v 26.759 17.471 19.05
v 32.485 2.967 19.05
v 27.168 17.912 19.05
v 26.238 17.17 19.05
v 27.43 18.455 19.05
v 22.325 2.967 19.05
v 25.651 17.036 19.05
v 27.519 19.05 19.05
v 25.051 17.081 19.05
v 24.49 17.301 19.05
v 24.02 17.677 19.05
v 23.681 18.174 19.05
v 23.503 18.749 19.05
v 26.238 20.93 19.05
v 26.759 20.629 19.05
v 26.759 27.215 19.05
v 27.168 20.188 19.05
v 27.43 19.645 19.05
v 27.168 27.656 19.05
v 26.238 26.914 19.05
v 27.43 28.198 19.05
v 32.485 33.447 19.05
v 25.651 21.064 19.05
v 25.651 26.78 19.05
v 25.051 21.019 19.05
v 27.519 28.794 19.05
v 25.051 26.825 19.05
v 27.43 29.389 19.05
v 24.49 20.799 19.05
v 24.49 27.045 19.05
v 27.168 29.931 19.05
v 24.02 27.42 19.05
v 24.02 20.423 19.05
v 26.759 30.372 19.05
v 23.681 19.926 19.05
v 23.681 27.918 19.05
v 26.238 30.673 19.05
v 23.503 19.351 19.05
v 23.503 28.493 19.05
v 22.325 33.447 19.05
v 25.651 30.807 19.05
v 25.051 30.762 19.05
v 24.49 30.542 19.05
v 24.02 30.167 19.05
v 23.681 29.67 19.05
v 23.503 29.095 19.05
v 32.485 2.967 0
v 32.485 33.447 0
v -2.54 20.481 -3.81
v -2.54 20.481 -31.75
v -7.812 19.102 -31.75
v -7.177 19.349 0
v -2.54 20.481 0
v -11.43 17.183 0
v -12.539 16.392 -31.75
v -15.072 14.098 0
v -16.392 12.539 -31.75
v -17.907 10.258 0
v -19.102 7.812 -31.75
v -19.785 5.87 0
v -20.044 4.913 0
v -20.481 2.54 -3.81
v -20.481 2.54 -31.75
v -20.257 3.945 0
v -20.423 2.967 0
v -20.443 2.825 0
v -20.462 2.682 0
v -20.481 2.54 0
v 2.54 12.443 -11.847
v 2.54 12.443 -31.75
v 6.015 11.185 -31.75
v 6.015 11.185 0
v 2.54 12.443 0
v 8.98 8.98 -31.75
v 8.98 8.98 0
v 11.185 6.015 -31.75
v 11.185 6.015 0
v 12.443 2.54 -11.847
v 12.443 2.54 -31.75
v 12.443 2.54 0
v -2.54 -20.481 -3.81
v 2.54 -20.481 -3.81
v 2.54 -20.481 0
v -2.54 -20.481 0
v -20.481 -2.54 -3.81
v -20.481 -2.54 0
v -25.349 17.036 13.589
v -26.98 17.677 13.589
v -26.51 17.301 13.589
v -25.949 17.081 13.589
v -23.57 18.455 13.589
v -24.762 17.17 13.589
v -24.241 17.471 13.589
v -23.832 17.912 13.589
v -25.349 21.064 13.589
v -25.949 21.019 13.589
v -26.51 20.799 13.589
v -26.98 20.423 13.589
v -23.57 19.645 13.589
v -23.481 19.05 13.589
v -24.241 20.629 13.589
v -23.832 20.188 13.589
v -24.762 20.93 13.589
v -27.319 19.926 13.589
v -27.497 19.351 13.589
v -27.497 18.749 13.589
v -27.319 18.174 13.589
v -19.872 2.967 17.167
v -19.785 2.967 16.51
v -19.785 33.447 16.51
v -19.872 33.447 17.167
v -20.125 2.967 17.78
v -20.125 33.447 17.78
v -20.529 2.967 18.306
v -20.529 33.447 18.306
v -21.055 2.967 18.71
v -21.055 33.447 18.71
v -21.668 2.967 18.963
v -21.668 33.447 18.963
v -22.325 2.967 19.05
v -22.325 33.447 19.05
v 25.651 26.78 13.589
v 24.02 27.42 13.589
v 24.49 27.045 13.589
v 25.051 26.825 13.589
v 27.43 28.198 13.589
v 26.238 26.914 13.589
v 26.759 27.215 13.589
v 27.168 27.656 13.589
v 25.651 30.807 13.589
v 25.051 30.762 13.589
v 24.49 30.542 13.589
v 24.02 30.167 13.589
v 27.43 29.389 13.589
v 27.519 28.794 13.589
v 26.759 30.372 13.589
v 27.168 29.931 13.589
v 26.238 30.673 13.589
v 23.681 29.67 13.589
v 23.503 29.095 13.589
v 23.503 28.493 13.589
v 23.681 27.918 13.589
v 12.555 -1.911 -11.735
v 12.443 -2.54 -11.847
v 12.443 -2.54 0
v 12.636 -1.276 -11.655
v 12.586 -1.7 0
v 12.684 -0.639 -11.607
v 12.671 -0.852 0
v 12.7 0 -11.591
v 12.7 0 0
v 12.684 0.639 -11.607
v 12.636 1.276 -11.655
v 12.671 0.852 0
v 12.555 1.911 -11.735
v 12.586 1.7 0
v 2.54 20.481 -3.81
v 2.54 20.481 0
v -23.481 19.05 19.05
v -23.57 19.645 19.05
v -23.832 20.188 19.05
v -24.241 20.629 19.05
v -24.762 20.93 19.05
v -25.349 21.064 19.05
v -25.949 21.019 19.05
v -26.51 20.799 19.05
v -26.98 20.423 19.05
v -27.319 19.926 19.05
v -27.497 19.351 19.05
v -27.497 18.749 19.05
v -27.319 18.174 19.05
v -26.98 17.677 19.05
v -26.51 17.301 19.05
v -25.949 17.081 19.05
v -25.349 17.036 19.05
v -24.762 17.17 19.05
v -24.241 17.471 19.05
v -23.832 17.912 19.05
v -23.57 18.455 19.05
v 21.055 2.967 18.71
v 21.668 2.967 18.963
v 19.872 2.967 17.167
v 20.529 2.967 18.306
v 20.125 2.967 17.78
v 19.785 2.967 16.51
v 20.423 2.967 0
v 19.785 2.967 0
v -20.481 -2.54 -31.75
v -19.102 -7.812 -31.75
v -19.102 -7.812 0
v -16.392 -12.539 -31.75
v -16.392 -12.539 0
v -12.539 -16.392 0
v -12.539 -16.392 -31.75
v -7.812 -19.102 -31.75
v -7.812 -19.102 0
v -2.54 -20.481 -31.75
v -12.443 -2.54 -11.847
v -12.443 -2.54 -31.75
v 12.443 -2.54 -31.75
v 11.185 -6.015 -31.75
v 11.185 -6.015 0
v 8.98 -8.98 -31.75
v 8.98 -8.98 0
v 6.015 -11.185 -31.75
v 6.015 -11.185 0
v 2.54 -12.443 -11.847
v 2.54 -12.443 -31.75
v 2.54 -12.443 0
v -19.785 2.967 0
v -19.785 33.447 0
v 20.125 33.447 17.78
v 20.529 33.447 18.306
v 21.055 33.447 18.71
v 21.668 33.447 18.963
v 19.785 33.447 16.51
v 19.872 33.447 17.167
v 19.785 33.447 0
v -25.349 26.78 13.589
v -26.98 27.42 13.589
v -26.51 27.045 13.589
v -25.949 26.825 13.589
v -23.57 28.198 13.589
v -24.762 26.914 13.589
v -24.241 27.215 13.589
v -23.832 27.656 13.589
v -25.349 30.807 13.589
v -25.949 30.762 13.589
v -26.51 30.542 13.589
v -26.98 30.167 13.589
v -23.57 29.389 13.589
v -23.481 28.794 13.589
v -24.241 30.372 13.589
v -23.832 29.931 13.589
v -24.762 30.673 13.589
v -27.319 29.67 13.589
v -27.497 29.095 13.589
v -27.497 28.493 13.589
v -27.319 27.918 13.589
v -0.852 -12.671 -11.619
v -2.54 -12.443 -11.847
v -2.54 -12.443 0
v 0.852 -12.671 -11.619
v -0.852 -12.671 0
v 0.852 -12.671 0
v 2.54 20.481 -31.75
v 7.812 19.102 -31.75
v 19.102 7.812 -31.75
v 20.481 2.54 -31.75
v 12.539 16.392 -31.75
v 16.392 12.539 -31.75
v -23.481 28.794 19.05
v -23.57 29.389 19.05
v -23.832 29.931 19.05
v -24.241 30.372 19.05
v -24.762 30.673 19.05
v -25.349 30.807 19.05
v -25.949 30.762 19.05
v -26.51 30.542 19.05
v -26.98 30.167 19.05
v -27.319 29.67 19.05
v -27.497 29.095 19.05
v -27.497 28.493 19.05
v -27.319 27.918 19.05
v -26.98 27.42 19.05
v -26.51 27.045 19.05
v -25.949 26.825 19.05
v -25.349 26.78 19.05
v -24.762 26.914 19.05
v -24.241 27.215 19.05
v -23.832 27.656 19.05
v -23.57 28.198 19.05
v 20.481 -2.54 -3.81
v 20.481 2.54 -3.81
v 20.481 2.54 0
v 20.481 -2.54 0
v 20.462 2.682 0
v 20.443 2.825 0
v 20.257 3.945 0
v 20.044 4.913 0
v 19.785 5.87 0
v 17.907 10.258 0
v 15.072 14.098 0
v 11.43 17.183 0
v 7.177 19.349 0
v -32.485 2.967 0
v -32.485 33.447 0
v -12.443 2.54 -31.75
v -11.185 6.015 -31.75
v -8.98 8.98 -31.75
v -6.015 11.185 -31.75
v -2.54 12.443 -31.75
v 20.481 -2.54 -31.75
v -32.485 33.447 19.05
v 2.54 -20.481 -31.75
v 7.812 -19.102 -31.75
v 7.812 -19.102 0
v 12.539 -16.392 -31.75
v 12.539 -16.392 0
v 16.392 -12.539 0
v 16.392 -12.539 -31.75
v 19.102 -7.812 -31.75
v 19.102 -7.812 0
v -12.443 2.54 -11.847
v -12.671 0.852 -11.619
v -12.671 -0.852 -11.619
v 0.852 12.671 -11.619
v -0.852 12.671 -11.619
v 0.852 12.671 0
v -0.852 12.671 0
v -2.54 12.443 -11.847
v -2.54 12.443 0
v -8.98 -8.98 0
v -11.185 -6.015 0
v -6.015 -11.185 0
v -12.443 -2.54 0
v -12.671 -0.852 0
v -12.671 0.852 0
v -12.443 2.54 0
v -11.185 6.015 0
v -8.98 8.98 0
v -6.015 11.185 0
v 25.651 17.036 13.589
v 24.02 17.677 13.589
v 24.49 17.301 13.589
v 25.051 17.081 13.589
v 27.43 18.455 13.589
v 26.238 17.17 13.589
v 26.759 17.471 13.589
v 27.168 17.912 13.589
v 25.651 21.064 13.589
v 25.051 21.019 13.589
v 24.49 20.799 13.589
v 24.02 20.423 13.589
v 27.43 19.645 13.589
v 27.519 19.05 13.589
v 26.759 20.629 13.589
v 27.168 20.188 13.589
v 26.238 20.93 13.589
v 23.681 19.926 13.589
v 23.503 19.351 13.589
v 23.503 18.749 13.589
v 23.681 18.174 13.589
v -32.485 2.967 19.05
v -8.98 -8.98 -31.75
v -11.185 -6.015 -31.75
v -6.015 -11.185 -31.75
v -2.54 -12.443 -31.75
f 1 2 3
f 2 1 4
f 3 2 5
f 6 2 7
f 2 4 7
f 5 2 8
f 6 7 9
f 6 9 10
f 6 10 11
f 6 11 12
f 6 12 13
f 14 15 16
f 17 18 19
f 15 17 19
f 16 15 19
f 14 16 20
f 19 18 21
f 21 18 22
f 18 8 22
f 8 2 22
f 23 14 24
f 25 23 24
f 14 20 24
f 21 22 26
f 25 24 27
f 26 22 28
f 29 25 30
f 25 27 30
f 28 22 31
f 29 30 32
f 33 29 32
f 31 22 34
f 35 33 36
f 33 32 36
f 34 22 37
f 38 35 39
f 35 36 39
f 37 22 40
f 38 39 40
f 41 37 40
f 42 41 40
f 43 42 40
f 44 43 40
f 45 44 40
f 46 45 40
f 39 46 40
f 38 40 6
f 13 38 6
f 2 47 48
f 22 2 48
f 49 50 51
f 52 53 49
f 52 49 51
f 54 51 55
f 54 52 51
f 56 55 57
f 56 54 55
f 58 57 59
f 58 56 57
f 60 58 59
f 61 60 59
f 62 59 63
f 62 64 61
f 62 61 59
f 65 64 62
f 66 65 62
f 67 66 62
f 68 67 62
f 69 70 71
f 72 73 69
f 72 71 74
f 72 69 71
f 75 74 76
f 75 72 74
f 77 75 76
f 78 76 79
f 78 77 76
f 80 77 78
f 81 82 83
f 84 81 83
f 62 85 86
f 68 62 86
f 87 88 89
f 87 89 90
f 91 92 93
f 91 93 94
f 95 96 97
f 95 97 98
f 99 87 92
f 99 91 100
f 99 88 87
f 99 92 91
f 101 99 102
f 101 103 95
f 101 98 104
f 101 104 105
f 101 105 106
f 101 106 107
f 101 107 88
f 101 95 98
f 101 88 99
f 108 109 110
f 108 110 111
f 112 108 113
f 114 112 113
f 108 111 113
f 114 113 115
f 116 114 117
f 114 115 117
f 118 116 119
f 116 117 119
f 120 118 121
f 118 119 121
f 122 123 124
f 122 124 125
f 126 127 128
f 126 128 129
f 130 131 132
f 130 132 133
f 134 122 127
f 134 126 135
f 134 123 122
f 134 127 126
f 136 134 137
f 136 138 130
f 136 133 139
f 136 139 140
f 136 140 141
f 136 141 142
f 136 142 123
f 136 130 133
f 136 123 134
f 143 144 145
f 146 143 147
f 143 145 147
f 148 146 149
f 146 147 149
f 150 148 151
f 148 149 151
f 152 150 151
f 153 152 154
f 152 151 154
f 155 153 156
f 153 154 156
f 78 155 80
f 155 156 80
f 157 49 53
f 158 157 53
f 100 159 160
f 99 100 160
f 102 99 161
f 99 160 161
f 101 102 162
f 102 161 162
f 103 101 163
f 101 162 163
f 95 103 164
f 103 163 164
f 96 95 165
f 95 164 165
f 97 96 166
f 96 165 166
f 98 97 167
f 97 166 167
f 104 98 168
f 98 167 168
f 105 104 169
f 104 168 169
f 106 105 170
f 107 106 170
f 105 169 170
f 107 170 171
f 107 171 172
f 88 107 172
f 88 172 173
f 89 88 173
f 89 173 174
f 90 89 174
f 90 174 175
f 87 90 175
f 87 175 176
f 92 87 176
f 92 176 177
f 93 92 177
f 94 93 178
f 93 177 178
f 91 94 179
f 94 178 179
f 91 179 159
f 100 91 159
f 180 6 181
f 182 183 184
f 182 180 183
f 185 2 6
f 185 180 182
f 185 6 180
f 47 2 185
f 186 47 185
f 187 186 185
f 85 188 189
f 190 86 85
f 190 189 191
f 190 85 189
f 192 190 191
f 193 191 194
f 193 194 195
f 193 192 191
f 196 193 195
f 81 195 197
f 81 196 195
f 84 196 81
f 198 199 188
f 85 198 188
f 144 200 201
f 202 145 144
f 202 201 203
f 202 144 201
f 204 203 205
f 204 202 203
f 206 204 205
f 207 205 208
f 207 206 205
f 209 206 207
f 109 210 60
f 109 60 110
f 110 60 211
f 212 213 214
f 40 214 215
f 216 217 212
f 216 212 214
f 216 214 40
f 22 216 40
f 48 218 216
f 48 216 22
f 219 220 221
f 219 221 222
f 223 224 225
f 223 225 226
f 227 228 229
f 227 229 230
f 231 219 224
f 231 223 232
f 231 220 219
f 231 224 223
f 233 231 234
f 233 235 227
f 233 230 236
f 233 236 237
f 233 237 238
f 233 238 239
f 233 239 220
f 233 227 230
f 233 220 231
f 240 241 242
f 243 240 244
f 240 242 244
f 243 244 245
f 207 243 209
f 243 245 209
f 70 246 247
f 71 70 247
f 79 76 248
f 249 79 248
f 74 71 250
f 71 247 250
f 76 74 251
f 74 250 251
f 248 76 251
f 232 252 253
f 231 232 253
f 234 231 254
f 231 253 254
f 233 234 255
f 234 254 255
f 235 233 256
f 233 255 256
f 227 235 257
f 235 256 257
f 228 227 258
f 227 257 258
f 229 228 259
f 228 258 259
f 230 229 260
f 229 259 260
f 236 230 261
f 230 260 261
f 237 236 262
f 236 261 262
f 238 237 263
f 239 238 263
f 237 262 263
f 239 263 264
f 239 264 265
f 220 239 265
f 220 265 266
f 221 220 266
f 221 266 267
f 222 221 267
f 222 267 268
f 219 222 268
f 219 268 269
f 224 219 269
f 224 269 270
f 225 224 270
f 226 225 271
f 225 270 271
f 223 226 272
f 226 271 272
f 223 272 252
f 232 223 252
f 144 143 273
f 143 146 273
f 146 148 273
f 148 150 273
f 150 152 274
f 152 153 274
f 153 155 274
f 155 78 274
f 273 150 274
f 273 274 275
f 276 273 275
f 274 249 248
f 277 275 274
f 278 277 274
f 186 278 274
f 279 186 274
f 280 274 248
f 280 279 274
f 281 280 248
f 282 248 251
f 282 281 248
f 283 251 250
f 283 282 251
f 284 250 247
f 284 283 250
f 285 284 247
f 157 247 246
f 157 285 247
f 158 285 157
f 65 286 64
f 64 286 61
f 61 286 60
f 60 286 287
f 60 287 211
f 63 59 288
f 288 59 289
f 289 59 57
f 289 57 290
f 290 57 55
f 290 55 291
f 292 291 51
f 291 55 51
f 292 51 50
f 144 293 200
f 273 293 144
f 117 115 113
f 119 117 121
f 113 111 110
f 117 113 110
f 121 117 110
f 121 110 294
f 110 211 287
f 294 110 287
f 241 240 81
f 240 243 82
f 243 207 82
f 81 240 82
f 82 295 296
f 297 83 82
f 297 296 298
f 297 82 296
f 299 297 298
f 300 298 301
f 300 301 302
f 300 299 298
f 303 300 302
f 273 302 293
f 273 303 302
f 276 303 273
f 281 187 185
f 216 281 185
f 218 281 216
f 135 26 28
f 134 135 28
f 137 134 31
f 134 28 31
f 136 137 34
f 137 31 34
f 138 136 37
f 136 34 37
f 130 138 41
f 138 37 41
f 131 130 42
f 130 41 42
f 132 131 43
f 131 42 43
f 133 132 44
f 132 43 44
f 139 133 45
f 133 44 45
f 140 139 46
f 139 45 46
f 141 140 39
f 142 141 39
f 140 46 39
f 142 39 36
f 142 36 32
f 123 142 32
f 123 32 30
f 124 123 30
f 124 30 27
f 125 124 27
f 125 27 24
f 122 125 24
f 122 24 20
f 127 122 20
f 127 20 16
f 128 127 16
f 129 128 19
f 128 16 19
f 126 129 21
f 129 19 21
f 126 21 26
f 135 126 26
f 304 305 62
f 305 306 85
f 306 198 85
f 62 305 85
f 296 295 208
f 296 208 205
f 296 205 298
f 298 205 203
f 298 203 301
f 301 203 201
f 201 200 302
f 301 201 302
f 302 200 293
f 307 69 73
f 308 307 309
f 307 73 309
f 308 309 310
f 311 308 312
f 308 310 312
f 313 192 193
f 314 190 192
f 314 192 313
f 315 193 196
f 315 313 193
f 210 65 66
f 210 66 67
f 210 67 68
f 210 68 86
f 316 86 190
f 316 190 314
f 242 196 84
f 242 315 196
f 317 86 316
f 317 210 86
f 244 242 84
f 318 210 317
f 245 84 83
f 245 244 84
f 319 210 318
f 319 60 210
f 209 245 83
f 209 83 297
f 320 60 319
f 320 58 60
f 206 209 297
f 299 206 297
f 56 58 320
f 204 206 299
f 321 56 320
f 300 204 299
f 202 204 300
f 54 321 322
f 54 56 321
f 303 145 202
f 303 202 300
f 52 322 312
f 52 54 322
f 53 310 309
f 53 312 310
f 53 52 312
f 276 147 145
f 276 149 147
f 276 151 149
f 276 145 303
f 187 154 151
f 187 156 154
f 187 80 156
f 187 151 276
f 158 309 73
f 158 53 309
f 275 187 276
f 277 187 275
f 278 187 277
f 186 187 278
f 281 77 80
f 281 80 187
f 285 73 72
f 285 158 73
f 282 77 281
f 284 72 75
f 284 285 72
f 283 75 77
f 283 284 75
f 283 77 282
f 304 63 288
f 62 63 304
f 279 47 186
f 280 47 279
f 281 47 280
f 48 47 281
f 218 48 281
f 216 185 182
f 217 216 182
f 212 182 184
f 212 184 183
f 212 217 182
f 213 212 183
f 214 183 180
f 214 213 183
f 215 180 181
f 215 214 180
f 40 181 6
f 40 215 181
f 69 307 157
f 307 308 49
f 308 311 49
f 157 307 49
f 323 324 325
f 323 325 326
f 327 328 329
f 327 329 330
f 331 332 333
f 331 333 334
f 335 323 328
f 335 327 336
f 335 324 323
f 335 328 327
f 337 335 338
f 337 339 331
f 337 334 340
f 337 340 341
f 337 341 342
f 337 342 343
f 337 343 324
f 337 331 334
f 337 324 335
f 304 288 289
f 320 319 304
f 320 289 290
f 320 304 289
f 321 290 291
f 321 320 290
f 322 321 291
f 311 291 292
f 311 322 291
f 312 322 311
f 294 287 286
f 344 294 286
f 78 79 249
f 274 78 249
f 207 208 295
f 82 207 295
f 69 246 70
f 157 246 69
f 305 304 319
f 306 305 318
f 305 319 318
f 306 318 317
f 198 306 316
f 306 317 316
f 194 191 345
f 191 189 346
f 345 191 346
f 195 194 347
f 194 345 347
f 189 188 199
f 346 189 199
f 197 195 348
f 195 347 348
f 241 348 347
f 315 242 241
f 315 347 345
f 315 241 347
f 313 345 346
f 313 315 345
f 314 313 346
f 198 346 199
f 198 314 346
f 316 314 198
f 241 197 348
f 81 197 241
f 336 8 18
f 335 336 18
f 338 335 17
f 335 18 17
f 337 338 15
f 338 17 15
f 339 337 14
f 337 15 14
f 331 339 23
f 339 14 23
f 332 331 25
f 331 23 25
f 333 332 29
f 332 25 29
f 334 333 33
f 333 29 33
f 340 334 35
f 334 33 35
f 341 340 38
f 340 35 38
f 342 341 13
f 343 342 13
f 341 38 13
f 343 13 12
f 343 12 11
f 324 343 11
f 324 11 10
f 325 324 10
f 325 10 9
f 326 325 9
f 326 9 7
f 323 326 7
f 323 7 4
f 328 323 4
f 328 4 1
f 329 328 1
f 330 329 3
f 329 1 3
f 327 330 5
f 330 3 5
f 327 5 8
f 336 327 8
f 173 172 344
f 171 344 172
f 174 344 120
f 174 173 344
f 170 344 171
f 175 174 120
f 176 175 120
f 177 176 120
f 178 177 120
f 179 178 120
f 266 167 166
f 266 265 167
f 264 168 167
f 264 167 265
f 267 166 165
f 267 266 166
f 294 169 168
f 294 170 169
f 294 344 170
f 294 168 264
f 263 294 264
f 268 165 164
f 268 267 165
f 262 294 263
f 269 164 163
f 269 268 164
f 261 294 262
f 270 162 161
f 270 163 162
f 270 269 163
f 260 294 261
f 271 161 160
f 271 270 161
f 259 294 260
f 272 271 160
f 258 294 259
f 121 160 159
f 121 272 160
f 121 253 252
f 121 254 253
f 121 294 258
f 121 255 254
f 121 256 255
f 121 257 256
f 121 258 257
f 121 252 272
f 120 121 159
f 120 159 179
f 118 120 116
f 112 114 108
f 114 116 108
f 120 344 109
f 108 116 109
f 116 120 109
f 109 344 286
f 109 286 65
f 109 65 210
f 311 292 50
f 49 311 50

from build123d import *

# Parameters (mm, degrees)
BOSS_EXTRUDE3_DEPTH   = 31.75
BOSS_EXTRUDE3_2_DEPTH = 31.75
BOSS_EXTRUDE3_3_DEPTH = 31.75
BOSS_EXTRUDE3_4_DEPTH = 31.75
BOSS_EXTRUDE4_DEPTH   = 5.08
CIRPATTERN2_COUNT     = 4
CUT_EXTRUDE1_DEPTH    = 47.752
BOSS_EXTRUDE6_DEPTH   = 19.05
SKETCH12_R            = 2.0193
CUT_EXTRUDE2_DEPTH    = 5.461
FILLET5_R             = 2.54


with BuildPart() as part:
    # Sketch4 → Boss-Extrude3 (new body)
    with BuildSketch(Plane.XY):
        with BuildLine():
            Line((-20.480595847, 2.54), (-12.443407893, 2.54))
            ThreePointArc((-12.443407893, 2.54), (-8.980256121, 8.980256121), (-2.54, 12.443407893))
            Line((-2.54, 12.443407893), (-2.54, 20.480595847))
            ThreePointArc((-2.54, 20.480595847), (-14.592916197, 14.592916197), (-20.480595847, 2.54))
        make_face()
    extrude(amount=-BOSS_EXTRUDE3_DEPTH)


with BuildPart() as body_2:
    # Sketch4 → Boss-Extrude3 2 (new body)
    with BuildSketch(Plane.XY):
        with BuildLine():
            ThreePointArc((-2.54, -12.443407893), (-8.980256121, -8.980256121), (-12.443407893, -2.54))
            Line((-12.443407893, -2.54), (-20.480595847, -2.54))
            ThreePointArc((-20.480595847, -2.54), (-14.592916197, -14.592916197), (-2.54, -20.480595847))
            Line((-2.54, -20.480595847), (-2.54, -12.443407893))
        make_face()
    extrude(amount=-BOSS_EXTRUDE3_2_DEPTH)


with BuildPart() as body_3:
    # Sketch4 → Boss-Extrude3 3 (new body)
    with BuildSketch(Plane.XY):
        with BuildLine():
            Line((2.54, 20.480595847), (2.54, 12.443407893))
            ThreePointArc((2.54, 12.443407893), (8.980256121, 8.980256121), (12.443407893, 2.54))
            Line((12.443407893, 2.54), (20.480595847, 2.54))
            ThreePointArc((20.480595847, 2.54), (14.592916197, 14.592916197), (2.54, 20.480595847))
        make_face()
    extrude(amount=-BOSS_EXTRUDE3_3_DEPTH)


with BuildPart() as body_4:
    # Sketch4 → Boss-Extrude3 4 (new body)
    with BuildSketch(Plane.XY):
        with BuildLine():
            ThreePointArc((12.443407893, -2.54), (8.980256121, -8.980256121), (2.54, -12.443407893))
            Line((2.54, -12.443407893), (2.54, -20.480595847))
            ThreePointArc((2.54, -20.480595847), (14.592916197, -14.592916197), (20.480595847, -2.54))
            Line((20.480595847, -2.54), (12.443407893, -2.54))
        make_face()
    extrude(amount=-BOSS_EXTRUDE3_4_DEPTH)


with BuildPart() as body_5:
    # Sketch7 → Boss-Extrude4 (new body)
    with BuildSketch(Plane.XZ.offset(-2.54)):
        Polygon((12.443407893, 0), (12.443407893, -11.847187954), (20.480595847, -3.81), (20.480595847, 0), align=None)
    extrude(amount=BOSS_EXTRUDE4_DEPTH)


with BuildPart() as cirpattern2_1:
    # CirPattern2: pattern copy
    add(body_5.part.rotate(Axis((0, 0, 0), (0, 0, 1)), 1 * 360 / CIRPATTERN2_COUNT))


with BuildPart() as cirpattern2_2:
    # CirPattern2: pattern copy
    add(body_5.part.rotate(Axis((0, 0, 0), (0, 0, 1)), 2 * 360 / CIRPATTERN2_COUNT))


with BuildPart() as cirpattern2_3:
    # CirPattern2: pattern copy
    add(body_5.part.rotate(Axis((0, 0, 0), (0, 0, 1)), 3 * 360 / CIRPATTERN2_COUNT))


with BuildPart() as body_3_1:
    add(body_3.part)

    # Combine1: union CirPattern2_2, body 2, CirPattern2_3, body 4, body 5, CirPattern2_1, part
    add(cirpattern2_2.part)
    add(body_2.part)
    add(cirpattern2_3.part)
    add(body_4.part)
    add(body_5.part)
    add(cirpattern2_1.part)
    add(part.part)

    # Sketch8 → Cut-Extrude1 (cut)
    with BuildSketch(Plane.XY):
        with BuildLine():
            Line((-2.54, 12.443407893), (2.54, 12.443407893))
            ThreePointArc((2.54, 12.443407893), (0, 12.7), (-2.54, 12.443407893))
        make_face()
        with BuildLine():
            Line((12.443407893, 2.54), (12.443407893, -2.54))
            ThreePointArc((12.443407893, -2.54), (12.635689143, -1.276463817), (12.7, 0))
            ThreePointArc((12.7, 0), (12.635689143, 1.276463817), (12.443407893, 2.54))
        make_face()
        with BuildLine():
            ThreePointArc((-2.54, -12.443407893), (0, -12.7), (2.54, -12.443407893))
            Line((2.54, -12.443407893), (-2.54, -12.443407893))
        make_face()
        with BuildLine():
            ThreePointArc((-12.443407893, 2.54), (-12.7, 0), (-12.443407893, -2.54))
            Line((-12.443407893, -2.54), (-12.443407893, 2.54))
        make_face()
    extrude(amount=-CUT_EXTRUDE1_DEPTH, mode=Mode.SUBTRACT)

    # Sketch11 → Boss-Extrude6 (add)
    with BuildSketch(Plane.XY):
        Polygon((-19.785000054, 33.446844079), (-32.485000054, 33.446844079), (-32.485000054, 14.396844079), (-32.485000054, 2.966844079), (-19.785000054, 2.966844079), align=None)
        Polygon((32.485000054, 33.446844079), (32.485000054, 14.396844079), (32.485000054, 2.966844079), (19.785000054, 2.966844079), (19.785000054, 33.446844079), align=None)
    extrude(amount=BOSS_EXTRUDE6_DEPTH)

    # Sketch12 → Cut-Extrude2 (cut)
    with BuildSketch(Plane.XY.offset(19.05)):
        with Locations((25.500000054, 28.793688158)):
            Circle(SKETCH12_R)
        with Locations((25.500000054, 19.05)):
            Circle(SKETCH12_R)
        with Locations((-25.500000054, 28.793688158)):
            Circle(SKETCH12_R)
        with Locations((-25.500000054, 19.05)):
            Circle(SKETCH12_R)
    extrude(amount=-CUT_EXTRUDE2_DEPTH, mode=Mode.SUBTRACT)

    # Fillet5
    fillet5_edges = [body_3_1.edges().sort_by_distance(p)[0] for p in [
        (-19.785000054, 18.206844079, 19.05),
        (19.785000054, 18.206844079, 19.05),
    ]]
    fillet(fillet5_edges, radius=FILLET5_R)


solid = body_3_1.part
